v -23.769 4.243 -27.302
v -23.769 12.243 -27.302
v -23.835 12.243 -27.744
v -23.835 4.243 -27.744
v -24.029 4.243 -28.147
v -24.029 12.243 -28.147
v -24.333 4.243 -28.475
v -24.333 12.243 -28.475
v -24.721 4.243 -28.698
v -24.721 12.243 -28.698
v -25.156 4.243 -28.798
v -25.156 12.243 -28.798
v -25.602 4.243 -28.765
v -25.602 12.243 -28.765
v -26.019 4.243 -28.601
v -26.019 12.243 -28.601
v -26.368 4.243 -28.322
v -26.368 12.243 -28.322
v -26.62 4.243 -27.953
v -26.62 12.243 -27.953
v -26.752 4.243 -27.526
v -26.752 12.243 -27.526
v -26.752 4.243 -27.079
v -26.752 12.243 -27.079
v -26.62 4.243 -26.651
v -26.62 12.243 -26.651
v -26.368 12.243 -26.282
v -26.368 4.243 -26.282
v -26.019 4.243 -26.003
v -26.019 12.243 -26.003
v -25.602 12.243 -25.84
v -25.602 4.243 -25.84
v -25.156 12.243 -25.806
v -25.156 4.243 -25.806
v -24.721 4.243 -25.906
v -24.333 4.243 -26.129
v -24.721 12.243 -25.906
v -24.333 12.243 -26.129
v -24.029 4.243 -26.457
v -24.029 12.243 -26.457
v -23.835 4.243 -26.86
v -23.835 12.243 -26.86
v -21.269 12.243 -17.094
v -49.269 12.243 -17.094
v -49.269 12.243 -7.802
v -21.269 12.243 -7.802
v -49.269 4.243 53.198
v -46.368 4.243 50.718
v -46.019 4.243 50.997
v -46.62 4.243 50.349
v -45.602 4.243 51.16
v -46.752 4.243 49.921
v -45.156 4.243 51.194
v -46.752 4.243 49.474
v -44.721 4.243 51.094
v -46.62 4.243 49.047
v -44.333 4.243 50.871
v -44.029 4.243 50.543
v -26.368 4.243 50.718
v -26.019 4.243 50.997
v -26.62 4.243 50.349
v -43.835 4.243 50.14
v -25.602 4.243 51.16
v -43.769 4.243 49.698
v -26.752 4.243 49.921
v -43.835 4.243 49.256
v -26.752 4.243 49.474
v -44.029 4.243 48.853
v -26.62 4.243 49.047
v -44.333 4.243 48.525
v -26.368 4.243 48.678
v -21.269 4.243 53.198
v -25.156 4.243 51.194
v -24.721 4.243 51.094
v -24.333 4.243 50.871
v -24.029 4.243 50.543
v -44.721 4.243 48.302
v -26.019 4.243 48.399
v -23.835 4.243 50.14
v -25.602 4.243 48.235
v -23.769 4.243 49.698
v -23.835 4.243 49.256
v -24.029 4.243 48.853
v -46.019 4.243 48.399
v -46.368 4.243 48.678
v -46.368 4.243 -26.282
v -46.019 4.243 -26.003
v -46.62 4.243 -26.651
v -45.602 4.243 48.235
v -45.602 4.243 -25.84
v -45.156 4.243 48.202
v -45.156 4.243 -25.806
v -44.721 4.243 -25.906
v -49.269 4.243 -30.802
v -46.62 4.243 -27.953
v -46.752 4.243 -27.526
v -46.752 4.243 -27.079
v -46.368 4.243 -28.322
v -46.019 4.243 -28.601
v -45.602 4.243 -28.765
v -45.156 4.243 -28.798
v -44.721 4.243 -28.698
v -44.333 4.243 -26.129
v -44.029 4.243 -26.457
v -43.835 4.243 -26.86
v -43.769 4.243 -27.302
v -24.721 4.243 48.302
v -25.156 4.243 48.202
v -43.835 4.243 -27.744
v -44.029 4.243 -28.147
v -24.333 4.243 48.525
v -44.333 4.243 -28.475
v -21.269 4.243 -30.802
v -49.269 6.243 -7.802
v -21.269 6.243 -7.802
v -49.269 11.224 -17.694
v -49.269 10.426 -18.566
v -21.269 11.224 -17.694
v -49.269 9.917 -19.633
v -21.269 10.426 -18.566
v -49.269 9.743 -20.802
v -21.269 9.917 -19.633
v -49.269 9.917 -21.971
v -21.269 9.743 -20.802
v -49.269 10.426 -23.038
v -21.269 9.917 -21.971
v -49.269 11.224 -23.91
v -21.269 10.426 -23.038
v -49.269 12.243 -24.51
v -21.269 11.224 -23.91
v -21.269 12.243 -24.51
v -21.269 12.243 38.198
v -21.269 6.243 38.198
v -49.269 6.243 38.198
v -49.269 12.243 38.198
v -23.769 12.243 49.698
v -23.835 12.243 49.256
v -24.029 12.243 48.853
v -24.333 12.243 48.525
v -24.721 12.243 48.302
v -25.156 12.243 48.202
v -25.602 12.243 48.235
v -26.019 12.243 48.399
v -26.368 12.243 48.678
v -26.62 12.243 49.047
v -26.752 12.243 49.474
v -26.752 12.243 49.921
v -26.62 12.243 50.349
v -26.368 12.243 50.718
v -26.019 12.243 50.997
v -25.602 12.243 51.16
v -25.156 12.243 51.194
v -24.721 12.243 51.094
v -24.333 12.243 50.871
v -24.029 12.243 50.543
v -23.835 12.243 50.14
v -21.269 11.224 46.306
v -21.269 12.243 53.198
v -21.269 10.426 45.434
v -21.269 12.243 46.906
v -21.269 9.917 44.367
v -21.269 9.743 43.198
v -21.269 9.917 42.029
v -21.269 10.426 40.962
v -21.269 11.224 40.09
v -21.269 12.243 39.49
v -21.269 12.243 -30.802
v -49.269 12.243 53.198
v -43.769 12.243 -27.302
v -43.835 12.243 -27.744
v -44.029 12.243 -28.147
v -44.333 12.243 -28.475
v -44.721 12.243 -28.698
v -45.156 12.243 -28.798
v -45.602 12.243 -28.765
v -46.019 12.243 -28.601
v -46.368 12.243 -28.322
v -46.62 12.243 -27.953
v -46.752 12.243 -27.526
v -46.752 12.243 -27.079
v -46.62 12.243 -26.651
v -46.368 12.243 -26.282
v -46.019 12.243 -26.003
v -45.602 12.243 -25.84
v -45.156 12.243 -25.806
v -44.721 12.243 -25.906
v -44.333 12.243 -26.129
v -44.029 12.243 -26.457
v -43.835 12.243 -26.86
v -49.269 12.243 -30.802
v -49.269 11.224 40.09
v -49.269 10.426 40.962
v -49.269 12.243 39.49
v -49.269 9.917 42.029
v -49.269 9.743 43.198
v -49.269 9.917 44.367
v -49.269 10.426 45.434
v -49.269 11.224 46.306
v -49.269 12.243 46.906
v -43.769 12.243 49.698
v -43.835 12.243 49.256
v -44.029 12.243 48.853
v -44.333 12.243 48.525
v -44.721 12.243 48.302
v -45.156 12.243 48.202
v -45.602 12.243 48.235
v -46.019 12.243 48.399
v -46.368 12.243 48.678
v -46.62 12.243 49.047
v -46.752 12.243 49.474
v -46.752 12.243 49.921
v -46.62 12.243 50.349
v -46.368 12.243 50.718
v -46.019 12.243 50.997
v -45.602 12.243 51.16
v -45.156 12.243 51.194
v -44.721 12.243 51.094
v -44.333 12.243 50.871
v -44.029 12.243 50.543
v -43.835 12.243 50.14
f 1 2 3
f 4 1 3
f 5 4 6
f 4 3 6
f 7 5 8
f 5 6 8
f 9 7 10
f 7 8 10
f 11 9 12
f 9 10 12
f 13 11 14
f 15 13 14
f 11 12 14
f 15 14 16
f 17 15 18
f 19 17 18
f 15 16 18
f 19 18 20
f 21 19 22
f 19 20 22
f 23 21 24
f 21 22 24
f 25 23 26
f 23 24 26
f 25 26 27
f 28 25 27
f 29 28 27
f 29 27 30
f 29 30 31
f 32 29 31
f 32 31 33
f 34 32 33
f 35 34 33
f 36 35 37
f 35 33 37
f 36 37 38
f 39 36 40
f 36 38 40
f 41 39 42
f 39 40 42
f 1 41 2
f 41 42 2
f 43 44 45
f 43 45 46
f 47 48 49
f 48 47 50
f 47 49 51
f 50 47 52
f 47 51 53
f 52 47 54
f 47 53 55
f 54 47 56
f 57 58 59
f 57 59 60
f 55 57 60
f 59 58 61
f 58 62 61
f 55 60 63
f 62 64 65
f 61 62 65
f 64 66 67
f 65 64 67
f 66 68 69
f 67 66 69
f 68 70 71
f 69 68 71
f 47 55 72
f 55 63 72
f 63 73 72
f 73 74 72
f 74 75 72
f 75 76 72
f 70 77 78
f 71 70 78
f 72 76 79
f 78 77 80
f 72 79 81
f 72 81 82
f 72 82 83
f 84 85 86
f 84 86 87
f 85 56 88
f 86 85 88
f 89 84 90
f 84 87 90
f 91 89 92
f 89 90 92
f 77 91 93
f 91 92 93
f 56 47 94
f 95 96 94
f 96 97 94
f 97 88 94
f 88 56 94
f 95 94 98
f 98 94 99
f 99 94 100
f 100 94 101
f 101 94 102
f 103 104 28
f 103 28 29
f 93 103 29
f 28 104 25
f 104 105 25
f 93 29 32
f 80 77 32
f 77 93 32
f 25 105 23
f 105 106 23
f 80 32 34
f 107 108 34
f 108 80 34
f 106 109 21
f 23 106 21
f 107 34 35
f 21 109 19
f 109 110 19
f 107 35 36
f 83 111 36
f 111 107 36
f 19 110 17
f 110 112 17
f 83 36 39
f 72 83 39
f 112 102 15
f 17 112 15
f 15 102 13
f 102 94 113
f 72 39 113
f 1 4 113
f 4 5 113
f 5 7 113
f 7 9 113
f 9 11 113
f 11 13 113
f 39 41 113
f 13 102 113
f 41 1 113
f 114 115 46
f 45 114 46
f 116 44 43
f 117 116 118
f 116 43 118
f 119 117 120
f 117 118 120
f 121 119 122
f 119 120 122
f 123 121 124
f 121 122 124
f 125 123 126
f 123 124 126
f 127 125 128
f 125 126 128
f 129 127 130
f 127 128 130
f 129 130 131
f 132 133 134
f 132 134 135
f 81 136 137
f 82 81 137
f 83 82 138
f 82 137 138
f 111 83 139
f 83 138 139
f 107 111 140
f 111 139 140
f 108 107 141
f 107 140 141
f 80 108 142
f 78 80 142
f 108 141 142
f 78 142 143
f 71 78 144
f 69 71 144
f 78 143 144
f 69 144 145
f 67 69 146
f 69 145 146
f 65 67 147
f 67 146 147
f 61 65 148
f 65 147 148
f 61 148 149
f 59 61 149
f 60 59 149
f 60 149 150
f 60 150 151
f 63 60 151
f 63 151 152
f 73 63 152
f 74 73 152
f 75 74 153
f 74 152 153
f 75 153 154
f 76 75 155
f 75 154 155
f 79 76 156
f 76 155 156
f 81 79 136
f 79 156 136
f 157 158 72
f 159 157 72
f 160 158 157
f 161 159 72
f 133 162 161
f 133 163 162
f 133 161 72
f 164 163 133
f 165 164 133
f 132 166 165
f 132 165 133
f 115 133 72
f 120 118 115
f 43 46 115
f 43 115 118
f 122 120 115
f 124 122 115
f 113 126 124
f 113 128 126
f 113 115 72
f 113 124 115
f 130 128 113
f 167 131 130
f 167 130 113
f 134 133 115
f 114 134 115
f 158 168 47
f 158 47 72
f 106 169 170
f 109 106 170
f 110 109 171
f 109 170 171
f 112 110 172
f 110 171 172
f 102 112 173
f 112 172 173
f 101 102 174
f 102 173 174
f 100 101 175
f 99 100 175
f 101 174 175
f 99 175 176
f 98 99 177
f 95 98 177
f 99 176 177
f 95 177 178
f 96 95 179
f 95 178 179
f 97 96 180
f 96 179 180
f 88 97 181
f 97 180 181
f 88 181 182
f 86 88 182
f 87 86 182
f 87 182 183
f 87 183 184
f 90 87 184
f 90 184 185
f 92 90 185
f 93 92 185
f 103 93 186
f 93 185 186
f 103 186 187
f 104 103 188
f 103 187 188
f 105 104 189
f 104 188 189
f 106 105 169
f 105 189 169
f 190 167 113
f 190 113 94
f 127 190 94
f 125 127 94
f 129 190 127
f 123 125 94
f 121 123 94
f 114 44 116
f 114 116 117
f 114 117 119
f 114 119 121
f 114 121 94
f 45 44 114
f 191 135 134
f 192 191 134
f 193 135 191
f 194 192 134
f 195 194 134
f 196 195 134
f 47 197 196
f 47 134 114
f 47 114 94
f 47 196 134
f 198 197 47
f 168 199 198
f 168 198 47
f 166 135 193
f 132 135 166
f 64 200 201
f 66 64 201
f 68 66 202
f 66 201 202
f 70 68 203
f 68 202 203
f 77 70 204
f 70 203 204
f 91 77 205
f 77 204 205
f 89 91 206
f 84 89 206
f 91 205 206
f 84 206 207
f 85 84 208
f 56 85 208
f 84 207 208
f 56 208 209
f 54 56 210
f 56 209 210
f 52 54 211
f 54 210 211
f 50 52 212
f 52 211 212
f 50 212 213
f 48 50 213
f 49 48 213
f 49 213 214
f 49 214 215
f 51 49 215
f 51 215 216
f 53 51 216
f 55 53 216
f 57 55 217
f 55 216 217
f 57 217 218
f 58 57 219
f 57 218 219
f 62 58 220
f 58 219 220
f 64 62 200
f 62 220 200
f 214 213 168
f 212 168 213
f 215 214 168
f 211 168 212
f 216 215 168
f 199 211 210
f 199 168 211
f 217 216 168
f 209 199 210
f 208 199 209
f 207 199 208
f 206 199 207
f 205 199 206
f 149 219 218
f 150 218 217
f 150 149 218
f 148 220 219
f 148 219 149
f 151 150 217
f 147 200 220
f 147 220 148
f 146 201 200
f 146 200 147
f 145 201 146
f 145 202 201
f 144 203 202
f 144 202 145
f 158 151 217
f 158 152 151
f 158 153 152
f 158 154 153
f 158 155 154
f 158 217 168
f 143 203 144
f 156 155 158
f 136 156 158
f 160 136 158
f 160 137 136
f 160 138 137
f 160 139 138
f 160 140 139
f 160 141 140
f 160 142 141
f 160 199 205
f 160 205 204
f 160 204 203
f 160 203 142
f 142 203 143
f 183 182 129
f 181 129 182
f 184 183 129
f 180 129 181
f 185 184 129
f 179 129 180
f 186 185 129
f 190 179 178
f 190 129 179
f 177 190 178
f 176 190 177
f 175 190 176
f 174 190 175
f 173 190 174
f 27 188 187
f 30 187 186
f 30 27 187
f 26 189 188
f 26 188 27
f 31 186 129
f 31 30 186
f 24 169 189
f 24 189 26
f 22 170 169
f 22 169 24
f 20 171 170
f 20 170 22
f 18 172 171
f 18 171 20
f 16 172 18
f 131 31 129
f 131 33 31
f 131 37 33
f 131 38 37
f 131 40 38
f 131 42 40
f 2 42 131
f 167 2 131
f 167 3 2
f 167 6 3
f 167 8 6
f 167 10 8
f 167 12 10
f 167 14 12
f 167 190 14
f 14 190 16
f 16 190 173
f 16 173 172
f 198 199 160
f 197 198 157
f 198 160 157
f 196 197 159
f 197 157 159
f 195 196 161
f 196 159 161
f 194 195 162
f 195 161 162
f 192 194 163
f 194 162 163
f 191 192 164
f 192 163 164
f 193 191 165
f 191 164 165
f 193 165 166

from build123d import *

# Parameters (mm, degrees)
SKETCH1_R               = 1.5
SKETCH1_W               = 28
SKETCH1_H               = 54
BOSS_EXTRUDE1_DEPTH     = 8
SKETCH4_W               = 46
SKETCH4_H               = 6
CUT_EXTRUDE1_DEPTH      = 1
CUT_EXTRUDE1_DEPTH_BACK = 29
SKETCH5_R               = 4
CUT_EXTRUDE2_DEPTH      = 1
CUT_EXTRUDE2_DEPTH_BACK = 29


with BuildPart() as part:
    # Sketch1 → Boss-Extrude1 (new body)
    with BuildSketch(Plane(origin=(0, 12.242650433, 0), x_dir=(1, 0, 0), z_dir=(0, 1, 0))):
        Polygon((-49.268515773, 16.802150236), (-49.268515773, 15.802150236), (-21.268515773, 15.802150236), (-21.268515773, 16.802150236), (-21.268515773, 17.094050992), (-21.268515773, 24.510249479), (-21.268515773, 24.802150236), (-21.268515773, 30.802150236), (-49.268515773, 30.802150236), (-49.268515773, 24.802150236), (-49.268515773, 24.510249479), (-49.268515773, 17.094050992), align=None)
        with Locations((-45.268515773, 27.302150236)):
            Circle(SKETCH1_R, mode=Mode.SUBTRACT)
        with Locations((-25.268515773, 27.302150236)):
            Circle(SKETCH1_R, mode=Mode.SUBTRACT)
        with Locations((-35.268515773, -11.197849764)):
            Rectangle(SKETCH1_W, SKETCH1_H)
        Polygon((-49.268515773, -47.197849764), (-49.268515773, -53.197849764), (-21.268515773, -53.197849764), (-21.268515773, -47.197849764), (-21.268515773, -46.905949008), (-21.268515773, -39.489750521), (-21.268515773, -39.197849764), (-21.268515773, -38.197849764), (-49.268515773, -38.197849764), (-49.268515773, -39.197849764), (-49.268515773, -39.489750521), (-49.268515773, -46.905949008), align=None)
        with Locations((-45.268515773, -49.697849764)):
            Circle(SKETCH1_R, mode=Mode.SUBTRACT)
        with Locations((-25.268515773, -49.697849764)):
            Circle(SKETCH1_R, mode=Mode.SUBTRACT)
    extrude(amount=-BOSS_EXTRUDE1_DEPTH)

    # Sketch4 → Cut-Extrude1 (cut, two sides)
    with BuildSketch(Plane(origin=(-21.268515773, 0, 0), x_dir=(0, 0, -1), z_dir=(1, 0, 0))) as cut_extrude1_sk:
        with Locations((-15.197849764, 9.242650433)):
            Rectangle(SKETCH4_W, SKETCH4_H)
    extrude(amount=CUT_EXTRUDE1_DEPTH, mode=Mode.SUBTRACT)
    extrude(cut_extrude1_sk.sketch, amount=-CUT_EXTRUDE1_DEPTH_BACK, mode=Mode.SUBTRACT)

    # Sketch5 → Cut-Extrude2 (cut, two sides)
    with BuildSketch(Plane(origin=(-21.268515773, 0, 0), x_dir=(0, 0, -1), z_dir=(1, 0, 0))) as cut_extrude2_sk:
        with Locations((-43.197849764, 13.742650433)):
            Circle(SKETCH5_R)
        with Locations((20.802150236, 13.742650433)):
            Circle(SKETCH5_R)
    extrude(amount=CUT_EXTRUDE2_DEPTH, mode=Mode.SUBTRACT)
    extrude(cut_extrude2_sk.sketch, amount=-CUT_EXTRUDE2_DEPTH_BACK, mode=Mode.SUBTRACT)


solid = part.part
